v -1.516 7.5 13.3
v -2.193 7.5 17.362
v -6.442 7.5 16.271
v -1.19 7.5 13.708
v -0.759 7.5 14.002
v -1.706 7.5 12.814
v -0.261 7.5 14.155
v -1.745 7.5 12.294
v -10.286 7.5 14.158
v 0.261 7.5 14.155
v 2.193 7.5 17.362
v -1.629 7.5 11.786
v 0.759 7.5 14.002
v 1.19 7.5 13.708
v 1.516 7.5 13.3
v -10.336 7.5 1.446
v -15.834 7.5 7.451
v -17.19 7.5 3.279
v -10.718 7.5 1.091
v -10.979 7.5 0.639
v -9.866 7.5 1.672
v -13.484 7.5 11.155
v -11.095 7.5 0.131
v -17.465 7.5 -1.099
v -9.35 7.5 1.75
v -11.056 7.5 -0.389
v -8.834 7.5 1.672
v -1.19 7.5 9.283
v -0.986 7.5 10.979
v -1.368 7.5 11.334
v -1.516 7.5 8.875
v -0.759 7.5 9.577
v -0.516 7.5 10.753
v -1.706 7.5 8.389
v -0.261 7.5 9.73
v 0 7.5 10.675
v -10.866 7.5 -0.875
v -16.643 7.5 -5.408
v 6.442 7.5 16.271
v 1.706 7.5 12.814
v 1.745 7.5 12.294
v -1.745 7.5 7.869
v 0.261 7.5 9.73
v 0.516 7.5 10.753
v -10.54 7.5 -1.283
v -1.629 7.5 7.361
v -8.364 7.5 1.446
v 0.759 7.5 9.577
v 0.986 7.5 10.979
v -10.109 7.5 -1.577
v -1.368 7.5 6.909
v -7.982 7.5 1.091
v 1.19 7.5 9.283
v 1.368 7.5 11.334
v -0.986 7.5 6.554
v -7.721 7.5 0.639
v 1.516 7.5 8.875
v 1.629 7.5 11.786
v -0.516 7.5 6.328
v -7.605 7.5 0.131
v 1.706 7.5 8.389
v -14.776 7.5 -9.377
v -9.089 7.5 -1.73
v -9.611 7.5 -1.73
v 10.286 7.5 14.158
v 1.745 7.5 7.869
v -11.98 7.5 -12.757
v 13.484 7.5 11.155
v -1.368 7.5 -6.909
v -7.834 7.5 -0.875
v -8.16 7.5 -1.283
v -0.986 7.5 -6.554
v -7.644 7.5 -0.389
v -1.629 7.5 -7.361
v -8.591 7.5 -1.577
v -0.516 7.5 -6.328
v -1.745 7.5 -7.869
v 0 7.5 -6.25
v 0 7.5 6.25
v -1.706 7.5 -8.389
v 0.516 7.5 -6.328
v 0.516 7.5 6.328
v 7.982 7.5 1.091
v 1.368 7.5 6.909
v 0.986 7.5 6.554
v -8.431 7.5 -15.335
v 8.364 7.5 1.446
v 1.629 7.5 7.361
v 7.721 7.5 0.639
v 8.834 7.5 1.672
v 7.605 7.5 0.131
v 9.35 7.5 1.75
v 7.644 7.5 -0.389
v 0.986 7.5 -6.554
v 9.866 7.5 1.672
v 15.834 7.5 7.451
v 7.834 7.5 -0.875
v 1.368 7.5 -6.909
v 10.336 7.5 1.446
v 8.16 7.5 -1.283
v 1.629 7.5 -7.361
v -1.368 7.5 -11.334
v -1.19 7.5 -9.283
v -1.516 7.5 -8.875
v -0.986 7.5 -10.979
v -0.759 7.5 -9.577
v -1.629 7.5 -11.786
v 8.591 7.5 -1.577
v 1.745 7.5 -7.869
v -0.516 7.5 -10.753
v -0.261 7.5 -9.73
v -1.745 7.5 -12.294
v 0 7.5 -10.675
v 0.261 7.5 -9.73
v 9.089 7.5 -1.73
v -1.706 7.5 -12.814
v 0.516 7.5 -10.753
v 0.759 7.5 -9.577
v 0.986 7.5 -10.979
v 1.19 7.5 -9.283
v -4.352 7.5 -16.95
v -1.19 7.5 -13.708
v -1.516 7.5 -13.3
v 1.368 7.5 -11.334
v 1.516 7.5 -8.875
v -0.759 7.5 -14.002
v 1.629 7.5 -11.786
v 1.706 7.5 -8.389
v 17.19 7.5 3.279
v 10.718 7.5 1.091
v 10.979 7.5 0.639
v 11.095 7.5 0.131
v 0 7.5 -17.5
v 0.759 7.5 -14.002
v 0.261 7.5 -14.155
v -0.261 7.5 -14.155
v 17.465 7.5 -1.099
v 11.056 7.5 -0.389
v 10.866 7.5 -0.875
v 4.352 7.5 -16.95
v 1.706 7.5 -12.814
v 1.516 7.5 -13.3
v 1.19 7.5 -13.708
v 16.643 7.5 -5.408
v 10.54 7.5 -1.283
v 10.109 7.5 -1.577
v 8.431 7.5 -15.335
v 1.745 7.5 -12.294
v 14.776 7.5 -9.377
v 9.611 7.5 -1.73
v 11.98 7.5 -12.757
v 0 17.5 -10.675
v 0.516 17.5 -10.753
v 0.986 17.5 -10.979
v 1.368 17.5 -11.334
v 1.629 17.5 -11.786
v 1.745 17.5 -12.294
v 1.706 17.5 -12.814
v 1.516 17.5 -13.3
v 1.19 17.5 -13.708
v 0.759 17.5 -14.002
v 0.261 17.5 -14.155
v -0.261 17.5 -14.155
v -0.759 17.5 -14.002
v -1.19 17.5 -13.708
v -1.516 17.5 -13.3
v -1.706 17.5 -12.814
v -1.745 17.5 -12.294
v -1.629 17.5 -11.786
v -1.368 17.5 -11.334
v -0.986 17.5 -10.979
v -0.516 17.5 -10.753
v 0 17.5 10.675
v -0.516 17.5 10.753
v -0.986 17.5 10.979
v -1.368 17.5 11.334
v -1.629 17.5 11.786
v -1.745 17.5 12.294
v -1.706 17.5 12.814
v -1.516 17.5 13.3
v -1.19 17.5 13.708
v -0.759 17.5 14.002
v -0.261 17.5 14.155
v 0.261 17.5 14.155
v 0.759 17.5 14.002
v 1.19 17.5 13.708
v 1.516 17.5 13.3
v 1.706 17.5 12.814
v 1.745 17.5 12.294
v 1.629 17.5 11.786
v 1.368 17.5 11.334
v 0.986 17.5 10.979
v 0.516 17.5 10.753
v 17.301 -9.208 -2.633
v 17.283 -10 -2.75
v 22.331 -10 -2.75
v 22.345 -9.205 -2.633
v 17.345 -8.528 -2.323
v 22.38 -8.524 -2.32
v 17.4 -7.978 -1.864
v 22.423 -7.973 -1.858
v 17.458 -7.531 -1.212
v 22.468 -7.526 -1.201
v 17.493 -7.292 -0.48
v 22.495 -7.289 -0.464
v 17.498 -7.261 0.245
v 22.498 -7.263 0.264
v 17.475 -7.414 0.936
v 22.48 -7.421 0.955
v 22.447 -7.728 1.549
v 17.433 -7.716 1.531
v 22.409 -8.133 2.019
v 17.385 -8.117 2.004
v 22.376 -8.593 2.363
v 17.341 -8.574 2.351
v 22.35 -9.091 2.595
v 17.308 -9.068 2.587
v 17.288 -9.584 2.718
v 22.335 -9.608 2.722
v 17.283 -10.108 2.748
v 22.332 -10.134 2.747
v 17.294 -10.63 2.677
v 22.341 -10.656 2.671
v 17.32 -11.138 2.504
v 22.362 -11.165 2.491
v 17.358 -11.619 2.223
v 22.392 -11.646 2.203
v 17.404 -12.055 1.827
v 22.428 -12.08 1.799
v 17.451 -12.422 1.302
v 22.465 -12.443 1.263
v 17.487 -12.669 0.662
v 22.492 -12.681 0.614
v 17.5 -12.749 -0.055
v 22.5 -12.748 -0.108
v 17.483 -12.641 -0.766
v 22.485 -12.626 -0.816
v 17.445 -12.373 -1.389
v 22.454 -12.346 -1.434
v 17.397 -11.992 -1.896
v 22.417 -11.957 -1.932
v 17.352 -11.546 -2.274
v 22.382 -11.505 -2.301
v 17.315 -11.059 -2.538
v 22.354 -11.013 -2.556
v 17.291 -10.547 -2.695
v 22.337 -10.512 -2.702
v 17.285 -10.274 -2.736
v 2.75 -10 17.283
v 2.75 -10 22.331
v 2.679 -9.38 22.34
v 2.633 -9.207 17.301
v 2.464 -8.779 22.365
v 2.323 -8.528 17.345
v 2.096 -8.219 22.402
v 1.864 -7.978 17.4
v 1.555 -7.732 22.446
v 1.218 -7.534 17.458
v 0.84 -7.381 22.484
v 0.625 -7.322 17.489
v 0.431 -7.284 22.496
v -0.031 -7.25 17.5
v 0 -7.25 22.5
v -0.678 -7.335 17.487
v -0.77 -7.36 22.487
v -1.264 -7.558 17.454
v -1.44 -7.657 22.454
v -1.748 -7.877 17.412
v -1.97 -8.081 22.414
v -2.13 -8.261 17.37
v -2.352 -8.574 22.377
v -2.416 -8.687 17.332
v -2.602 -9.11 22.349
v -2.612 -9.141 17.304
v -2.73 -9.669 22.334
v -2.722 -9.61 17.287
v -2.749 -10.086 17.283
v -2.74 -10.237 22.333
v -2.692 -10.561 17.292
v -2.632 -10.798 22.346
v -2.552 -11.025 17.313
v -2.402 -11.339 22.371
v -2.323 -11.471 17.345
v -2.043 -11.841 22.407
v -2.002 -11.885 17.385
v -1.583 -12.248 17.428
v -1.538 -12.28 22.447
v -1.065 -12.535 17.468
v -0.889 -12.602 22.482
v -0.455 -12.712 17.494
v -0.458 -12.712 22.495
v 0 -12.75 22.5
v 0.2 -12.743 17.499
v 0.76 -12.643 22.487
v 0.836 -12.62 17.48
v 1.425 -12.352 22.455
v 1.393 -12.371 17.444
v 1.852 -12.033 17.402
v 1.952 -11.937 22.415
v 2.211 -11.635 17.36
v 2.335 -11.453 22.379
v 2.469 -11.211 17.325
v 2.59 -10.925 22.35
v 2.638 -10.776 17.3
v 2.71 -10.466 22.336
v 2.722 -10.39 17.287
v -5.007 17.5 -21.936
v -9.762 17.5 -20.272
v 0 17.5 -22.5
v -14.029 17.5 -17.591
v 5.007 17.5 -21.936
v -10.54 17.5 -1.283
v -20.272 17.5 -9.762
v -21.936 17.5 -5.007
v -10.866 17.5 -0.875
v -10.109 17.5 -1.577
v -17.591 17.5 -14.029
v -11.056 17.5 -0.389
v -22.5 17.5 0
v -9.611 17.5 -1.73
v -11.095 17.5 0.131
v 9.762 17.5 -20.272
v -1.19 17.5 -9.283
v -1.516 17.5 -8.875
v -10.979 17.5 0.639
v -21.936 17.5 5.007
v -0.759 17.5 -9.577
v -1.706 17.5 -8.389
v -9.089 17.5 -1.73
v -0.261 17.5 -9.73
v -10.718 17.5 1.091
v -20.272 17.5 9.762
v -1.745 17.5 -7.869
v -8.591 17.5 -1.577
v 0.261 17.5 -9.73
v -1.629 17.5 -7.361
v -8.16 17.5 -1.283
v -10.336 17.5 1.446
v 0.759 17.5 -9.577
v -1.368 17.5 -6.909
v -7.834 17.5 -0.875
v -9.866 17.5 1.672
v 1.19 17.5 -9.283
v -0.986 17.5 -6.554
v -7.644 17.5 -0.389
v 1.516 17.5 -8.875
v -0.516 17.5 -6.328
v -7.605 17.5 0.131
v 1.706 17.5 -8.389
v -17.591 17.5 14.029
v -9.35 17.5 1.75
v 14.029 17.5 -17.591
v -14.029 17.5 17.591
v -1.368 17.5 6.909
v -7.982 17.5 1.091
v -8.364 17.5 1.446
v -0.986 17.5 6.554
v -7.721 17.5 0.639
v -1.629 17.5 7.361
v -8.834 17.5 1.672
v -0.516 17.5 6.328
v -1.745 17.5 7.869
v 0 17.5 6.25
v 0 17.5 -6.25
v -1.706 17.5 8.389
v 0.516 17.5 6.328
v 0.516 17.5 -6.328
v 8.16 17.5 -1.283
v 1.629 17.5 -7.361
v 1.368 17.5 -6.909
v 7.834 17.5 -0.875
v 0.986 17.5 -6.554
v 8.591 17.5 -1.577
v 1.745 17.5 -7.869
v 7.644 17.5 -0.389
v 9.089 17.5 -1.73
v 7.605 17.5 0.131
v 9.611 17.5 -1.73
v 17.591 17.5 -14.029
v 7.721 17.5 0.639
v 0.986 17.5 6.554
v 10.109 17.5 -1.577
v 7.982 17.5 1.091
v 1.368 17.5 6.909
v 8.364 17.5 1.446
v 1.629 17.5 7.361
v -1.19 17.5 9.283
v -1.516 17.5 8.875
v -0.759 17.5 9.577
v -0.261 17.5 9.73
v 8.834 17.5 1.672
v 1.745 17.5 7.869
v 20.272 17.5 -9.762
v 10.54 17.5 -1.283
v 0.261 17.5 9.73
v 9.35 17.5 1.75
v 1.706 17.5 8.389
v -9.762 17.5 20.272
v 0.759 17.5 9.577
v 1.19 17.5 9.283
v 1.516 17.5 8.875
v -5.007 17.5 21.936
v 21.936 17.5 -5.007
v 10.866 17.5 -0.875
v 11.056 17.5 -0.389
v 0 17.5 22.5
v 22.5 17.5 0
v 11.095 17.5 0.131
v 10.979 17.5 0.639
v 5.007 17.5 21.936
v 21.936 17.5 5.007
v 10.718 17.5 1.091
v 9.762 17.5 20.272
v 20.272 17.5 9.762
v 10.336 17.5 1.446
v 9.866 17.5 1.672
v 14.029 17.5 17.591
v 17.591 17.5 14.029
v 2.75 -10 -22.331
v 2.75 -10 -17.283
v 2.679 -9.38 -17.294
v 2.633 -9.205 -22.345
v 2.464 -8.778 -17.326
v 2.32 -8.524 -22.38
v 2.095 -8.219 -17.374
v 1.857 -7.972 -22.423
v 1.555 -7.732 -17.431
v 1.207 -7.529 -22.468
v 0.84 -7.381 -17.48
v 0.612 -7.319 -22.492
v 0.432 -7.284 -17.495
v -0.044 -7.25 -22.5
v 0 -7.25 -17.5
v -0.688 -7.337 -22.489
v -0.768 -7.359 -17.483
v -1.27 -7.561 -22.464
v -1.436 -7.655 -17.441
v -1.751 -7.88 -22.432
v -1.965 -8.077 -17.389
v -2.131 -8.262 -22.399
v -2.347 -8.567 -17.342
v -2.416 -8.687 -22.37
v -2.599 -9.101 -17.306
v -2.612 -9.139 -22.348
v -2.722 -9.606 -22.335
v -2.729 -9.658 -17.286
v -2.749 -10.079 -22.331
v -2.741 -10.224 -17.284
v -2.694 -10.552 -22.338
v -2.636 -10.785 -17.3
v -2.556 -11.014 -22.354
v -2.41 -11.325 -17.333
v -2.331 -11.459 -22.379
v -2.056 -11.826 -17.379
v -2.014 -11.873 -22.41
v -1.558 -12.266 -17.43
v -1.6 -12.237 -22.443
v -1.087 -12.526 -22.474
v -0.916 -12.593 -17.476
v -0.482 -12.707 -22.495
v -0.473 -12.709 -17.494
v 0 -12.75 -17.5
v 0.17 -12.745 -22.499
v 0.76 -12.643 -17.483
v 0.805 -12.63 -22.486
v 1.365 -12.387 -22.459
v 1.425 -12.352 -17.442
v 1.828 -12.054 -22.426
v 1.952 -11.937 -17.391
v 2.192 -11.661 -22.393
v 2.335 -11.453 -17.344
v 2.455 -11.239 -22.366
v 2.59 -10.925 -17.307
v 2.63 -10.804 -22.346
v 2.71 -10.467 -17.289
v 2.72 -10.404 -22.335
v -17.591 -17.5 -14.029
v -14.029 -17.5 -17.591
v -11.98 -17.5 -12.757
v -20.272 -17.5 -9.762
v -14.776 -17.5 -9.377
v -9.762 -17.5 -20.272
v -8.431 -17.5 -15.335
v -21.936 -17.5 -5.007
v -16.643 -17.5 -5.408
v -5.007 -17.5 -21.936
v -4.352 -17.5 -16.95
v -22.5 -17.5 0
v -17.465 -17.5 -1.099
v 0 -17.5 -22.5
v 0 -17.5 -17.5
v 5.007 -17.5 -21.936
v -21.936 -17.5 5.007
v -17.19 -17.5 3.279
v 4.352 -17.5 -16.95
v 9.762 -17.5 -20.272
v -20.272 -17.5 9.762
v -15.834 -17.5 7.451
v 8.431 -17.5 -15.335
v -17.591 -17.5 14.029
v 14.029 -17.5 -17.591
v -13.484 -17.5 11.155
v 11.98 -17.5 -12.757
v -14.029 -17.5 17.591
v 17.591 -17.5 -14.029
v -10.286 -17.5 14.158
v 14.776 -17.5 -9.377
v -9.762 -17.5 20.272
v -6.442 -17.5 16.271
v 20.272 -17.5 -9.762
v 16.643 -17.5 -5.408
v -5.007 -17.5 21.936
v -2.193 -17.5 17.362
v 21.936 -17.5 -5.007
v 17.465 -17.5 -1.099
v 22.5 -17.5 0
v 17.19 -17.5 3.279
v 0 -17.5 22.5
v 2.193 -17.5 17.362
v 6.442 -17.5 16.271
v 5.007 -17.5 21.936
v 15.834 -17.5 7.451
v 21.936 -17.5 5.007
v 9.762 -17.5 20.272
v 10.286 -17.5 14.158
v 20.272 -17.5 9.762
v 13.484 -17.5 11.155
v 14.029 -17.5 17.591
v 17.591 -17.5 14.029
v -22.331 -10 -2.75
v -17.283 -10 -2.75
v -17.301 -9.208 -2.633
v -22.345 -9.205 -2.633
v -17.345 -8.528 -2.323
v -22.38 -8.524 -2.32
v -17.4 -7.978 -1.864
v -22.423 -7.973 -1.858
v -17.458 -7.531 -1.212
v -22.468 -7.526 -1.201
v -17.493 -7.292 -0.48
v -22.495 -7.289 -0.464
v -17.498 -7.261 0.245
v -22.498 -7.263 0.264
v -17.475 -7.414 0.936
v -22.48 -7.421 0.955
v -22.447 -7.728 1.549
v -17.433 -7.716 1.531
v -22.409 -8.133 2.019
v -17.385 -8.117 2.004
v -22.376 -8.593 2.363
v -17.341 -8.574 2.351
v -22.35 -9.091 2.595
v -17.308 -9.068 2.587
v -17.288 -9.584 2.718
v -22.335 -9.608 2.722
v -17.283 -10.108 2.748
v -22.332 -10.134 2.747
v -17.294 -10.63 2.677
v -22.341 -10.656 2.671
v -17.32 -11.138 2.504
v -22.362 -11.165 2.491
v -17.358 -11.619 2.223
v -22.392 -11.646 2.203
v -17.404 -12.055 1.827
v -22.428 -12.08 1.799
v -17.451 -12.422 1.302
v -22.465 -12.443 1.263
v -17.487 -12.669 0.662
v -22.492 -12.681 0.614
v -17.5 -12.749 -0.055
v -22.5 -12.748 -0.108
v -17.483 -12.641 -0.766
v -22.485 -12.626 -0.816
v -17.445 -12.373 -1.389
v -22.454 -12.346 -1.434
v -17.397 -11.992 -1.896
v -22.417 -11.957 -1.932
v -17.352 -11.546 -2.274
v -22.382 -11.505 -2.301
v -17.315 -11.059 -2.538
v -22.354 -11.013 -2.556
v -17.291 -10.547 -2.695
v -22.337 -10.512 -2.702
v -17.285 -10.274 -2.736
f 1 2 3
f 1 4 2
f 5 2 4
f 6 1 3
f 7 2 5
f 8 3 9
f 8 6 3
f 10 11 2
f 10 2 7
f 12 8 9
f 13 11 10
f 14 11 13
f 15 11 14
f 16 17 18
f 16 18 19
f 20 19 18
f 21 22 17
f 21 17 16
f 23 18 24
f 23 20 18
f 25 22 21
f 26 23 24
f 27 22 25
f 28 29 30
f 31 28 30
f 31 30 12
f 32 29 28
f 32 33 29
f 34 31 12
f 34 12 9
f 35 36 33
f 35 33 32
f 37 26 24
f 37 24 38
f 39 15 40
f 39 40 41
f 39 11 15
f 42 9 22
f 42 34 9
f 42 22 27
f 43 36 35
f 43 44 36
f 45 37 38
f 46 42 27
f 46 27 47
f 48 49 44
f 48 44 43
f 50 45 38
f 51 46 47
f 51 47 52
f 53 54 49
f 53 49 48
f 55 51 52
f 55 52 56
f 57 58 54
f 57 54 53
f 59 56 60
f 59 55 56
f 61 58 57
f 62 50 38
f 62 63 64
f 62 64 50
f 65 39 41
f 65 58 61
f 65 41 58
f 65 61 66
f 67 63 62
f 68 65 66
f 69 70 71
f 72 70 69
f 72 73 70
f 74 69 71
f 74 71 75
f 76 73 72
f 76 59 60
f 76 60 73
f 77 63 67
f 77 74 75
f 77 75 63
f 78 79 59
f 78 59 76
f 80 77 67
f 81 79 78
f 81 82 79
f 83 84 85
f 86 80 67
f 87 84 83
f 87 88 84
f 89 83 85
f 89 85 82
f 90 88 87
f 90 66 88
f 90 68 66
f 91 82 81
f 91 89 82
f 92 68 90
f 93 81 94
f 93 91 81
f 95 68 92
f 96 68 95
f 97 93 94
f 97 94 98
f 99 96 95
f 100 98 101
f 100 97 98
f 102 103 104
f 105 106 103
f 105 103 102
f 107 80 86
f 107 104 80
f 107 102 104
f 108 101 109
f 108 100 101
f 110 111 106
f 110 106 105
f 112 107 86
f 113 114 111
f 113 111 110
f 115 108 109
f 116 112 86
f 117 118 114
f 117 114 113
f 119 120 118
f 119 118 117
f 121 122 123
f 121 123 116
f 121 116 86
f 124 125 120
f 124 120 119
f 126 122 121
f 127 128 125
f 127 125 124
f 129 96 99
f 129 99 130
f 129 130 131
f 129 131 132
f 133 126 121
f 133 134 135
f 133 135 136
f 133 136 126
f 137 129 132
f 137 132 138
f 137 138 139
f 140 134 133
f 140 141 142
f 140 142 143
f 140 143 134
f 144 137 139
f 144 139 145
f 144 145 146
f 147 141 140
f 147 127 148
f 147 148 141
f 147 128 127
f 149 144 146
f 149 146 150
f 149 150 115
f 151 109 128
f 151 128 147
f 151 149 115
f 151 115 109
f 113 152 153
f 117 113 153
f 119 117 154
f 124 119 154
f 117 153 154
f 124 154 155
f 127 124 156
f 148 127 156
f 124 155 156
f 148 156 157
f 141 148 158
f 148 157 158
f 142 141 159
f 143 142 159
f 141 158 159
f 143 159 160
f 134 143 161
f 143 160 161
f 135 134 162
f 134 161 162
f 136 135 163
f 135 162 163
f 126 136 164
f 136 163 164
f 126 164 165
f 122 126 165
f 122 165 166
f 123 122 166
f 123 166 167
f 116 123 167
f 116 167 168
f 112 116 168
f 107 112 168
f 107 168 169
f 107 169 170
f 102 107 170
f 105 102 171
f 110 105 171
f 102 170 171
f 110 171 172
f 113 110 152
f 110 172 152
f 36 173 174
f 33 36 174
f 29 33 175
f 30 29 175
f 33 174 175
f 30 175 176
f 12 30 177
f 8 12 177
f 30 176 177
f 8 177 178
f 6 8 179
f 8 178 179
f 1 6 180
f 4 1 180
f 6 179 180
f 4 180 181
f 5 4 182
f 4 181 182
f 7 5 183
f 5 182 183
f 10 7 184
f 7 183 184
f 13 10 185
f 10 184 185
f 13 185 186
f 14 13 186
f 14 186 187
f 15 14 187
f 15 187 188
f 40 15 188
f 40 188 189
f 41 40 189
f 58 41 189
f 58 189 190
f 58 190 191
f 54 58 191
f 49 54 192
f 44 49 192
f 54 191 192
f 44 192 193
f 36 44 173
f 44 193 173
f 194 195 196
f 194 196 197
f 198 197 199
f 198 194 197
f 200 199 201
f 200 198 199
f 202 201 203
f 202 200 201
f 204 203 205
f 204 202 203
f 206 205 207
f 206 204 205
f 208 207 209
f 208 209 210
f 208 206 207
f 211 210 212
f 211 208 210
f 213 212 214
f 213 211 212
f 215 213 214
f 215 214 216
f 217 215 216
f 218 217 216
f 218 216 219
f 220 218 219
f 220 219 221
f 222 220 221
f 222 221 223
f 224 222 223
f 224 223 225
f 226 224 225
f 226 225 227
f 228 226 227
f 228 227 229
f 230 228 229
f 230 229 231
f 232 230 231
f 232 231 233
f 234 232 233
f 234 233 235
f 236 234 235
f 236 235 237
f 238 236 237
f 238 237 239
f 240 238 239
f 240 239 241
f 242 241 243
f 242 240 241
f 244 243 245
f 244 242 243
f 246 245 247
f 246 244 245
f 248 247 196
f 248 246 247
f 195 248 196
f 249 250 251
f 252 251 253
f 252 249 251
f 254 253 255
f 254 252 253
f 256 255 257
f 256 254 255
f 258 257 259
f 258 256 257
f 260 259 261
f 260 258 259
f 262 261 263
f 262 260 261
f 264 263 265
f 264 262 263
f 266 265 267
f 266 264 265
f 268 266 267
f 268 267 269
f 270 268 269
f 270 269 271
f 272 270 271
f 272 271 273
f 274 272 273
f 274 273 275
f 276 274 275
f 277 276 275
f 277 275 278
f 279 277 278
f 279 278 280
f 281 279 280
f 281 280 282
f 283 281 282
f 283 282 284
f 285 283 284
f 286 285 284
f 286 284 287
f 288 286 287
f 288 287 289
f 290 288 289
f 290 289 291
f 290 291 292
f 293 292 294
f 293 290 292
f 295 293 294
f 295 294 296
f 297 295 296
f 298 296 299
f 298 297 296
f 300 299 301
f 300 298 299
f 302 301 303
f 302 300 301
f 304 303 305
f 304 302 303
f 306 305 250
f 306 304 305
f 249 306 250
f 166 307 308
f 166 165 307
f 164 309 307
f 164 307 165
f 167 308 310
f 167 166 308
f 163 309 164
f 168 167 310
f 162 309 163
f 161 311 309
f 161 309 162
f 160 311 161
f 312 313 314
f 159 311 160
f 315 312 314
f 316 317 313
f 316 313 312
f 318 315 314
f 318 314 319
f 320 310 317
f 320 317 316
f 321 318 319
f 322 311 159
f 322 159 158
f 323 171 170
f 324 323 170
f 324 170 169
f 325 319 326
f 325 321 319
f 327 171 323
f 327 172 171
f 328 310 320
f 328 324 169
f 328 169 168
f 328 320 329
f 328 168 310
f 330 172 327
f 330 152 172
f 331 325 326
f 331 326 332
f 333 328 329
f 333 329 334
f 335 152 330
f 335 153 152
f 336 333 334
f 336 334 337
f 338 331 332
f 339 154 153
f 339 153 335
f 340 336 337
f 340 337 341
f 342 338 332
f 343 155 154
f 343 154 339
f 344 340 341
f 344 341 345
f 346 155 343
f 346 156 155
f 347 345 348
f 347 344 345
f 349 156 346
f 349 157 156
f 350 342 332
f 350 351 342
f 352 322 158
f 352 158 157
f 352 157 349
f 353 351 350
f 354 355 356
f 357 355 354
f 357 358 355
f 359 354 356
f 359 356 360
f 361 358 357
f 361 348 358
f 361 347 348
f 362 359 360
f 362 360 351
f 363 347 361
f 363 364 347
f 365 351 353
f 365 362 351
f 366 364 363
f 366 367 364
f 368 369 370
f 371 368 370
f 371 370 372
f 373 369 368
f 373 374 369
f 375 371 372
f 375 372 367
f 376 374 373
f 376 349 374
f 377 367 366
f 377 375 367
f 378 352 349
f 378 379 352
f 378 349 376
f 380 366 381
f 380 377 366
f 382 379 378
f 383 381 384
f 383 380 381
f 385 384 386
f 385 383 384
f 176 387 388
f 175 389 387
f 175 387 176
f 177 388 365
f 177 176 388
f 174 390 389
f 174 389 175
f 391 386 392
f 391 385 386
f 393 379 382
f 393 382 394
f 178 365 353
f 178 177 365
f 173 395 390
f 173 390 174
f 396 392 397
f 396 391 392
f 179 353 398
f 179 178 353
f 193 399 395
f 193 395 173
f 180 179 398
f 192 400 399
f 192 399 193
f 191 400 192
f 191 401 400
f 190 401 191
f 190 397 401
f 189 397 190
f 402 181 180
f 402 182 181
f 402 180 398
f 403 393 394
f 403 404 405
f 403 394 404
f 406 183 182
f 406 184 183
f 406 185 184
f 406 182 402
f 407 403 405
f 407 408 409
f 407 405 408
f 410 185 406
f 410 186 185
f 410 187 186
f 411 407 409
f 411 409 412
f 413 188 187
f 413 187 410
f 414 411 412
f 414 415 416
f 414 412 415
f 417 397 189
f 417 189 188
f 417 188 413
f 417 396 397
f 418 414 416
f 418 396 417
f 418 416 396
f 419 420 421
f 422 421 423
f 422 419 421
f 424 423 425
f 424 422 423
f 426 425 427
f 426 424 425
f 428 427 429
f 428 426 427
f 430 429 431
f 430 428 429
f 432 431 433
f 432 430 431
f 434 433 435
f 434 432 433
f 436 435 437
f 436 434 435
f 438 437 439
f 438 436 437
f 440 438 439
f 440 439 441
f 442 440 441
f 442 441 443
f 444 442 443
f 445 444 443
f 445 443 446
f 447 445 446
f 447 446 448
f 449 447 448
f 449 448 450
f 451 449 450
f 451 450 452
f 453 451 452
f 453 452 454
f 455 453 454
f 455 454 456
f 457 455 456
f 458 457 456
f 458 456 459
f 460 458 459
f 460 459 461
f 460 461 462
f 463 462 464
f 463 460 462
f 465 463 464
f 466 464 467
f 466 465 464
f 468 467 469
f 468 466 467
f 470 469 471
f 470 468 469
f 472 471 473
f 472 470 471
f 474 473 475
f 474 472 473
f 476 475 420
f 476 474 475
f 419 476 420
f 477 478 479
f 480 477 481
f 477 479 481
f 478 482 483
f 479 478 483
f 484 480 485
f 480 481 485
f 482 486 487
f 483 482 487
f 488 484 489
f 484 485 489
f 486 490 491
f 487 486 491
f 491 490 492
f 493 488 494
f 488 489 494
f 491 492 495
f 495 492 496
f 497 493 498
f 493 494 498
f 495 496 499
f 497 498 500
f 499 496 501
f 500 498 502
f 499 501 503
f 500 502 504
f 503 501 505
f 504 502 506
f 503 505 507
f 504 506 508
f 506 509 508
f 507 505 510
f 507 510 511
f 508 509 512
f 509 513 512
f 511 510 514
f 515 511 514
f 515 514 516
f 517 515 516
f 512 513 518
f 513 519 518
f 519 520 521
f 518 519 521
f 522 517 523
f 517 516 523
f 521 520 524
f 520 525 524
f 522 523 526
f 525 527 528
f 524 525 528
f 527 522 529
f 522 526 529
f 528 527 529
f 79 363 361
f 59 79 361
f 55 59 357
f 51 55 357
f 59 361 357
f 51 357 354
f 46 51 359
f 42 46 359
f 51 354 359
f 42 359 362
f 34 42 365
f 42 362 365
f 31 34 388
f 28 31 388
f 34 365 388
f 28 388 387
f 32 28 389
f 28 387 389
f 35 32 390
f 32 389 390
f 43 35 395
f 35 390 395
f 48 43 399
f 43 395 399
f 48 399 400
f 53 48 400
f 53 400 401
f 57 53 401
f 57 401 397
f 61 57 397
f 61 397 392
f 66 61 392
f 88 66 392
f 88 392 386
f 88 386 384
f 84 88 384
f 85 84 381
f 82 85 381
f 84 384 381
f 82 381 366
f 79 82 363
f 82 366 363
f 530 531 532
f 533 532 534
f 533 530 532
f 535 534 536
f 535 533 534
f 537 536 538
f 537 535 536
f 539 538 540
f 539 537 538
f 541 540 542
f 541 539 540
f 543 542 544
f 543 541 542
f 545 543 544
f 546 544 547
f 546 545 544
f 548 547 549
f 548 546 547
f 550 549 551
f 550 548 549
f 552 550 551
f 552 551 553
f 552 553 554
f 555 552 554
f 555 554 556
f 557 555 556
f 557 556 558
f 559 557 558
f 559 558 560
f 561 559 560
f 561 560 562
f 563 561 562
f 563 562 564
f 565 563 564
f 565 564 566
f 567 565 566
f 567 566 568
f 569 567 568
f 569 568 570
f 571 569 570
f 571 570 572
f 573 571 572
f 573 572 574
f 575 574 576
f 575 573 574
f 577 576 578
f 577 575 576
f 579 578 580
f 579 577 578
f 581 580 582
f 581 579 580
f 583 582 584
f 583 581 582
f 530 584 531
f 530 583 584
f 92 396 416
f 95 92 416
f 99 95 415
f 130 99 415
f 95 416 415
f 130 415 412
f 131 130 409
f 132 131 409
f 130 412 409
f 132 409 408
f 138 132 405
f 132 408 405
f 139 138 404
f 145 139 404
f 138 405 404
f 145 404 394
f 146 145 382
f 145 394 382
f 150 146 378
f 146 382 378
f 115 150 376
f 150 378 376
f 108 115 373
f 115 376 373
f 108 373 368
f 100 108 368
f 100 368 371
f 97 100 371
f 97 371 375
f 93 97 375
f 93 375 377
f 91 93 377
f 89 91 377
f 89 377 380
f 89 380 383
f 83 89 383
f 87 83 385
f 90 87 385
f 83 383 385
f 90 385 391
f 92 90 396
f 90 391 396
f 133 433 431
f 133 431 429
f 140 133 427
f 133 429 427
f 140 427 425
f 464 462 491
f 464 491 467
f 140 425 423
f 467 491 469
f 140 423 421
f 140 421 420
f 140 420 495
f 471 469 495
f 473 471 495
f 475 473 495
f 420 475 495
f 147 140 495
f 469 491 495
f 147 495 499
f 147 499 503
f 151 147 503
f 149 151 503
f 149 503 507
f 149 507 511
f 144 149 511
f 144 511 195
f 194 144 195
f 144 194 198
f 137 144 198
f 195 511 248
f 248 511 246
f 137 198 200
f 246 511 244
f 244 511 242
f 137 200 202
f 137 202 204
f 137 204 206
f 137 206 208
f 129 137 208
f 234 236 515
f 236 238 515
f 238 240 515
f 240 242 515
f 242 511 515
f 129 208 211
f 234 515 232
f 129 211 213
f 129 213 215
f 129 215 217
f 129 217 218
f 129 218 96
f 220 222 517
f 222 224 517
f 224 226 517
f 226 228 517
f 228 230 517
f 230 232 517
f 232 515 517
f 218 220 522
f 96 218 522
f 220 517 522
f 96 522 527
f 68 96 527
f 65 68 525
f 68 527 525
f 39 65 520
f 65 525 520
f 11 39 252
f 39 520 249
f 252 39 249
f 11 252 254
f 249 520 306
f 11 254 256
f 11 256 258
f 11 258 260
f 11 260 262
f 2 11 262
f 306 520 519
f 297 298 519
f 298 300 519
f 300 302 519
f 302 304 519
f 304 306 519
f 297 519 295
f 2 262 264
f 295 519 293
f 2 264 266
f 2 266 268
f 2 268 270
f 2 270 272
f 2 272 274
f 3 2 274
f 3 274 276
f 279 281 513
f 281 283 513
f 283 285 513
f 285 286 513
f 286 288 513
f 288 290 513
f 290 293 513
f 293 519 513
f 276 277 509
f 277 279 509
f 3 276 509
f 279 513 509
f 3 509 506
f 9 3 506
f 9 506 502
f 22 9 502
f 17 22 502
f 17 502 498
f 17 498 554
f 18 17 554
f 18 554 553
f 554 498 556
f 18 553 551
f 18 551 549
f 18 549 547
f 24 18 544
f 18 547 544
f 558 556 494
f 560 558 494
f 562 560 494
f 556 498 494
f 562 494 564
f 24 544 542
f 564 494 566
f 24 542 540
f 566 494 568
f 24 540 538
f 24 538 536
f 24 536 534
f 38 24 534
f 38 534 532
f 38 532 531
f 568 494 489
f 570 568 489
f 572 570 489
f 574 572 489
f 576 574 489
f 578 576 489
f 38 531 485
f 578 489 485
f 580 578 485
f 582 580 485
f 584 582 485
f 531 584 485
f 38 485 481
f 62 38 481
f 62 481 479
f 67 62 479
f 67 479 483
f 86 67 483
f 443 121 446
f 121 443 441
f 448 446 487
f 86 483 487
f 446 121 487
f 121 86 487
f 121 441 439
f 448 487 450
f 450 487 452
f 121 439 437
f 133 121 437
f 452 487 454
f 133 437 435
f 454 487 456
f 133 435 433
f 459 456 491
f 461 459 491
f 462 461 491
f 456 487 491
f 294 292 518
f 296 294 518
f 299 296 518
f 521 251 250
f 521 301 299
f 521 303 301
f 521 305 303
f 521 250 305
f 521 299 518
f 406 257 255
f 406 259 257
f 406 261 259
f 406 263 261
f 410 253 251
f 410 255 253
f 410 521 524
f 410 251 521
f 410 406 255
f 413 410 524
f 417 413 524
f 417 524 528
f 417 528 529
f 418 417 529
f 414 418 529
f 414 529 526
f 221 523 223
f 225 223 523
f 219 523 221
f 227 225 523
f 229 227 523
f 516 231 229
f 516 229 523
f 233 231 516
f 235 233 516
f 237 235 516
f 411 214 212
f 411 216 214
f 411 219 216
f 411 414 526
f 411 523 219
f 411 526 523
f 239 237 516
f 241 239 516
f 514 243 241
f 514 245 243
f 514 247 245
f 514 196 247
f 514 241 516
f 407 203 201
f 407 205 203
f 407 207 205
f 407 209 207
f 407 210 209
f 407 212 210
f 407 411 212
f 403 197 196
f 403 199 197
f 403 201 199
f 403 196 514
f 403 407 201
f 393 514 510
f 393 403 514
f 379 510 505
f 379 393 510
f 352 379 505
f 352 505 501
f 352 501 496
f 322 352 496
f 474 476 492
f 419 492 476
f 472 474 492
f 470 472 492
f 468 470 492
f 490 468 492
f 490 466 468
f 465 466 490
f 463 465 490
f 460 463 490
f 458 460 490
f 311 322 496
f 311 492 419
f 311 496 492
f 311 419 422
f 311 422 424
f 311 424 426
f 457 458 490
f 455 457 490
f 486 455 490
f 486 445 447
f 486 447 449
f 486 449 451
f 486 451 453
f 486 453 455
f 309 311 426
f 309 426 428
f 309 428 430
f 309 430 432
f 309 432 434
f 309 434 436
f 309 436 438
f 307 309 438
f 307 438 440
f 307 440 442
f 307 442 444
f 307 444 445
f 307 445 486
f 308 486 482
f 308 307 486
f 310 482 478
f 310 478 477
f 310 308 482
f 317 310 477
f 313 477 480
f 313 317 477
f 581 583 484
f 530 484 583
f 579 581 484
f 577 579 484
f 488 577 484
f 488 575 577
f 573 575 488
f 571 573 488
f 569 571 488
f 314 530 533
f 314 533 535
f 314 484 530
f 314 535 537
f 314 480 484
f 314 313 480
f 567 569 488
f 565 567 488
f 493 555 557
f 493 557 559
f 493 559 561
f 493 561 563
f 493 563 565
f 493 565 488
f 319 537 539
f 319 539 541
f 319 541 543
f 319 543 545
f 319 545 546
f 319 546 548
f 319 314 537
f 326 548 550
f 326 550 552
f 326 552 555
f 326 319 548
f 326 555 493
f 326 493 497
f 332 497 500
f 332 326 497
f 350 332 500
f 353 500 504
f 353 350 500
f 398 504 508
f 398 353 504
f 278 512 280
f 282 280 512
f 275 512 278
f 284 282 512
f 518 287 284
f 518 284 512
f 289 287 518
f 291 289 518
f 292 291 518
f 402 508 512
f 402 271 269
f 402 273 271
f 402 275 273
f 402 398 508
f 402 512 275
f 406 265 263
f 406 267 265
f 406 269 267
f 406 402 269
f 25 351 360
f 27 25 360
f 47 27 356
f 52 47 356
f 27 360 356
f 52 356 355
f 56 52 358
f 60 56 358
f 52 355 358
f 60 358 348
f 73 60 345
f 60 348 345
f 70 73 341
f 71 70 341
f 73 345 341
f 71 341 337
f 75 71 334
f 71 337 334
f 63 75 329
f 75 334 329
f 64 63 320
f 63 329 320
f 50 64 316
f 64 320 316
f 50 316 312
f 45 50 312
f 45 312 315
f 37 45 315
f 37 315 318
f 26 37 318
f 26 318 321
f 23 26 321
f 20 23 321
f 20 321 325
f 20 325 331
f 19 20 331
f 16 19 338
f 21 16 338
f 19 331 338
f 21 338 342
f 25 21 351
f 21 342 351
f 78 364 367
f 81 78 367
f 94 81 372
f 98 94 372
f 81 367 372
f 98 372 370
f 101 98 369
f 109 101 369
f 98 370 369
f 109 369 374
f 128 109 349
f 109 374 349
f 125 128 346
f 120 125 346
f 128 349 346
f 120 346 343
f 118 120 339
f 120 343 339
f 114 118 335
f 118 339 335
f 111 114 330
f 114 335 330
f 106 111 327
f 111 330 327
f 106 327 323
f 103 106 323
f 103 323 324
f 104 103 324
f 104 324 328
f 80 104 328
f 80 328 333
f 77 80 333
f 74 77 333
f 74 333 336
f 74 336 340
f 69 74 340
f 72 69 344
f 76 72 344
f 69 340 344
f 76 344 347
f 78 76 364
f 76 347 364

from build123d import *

# Parameters (mm, degrees)
SKETCH1_R               = 22.5
BOSS_EXTRUDE1_DEPTH     = 17.5
SKETCH2_R               = 17.5
CUT_EXTRUDE1_DEPTH      = 25
CUT_EXTRUDE2_DEPTH      = 37.314597616
CUT_EXTRUDE2_DEPTH_BACK = 37.314597616
SKETCH3_R               = 2.75
CUT_EXTRUDE3_DEPTH      = 37.314597788
CUT_EXTRUDE3_DEPTH_BACK = 37.314597788
SKETCH4_R               = 2.75
SKETCH5_R               = 1.75
CUT_EXTRUDE4_DEPTH      = 10


with BuildPart() as part:
    # Sketch1 → Boss-Extrude1 (new, symmetric)
    with BuildSketch(Plane(origin=(0, 0, 0), x_dir=(1, 0, 0), z_dir=(0, 1, 0))):
        with Locations(Location((0, 0, 0), (0, 0, 270))):
            Circle(SKETCH1_R)
    extrude(amount=BOSS_EXTRUDE1_DEPTH, both=True)

    # Sketch2 → Cut-Extrude1 (cut)
    with BuildSketch(Plane.XZ.offset(17.5)):
        with Locations(Location((0, 0, 0), (0, 0, 270))):
            Circle(SKETCH2_R)
    extrude(amount=-CUT_EXTRUDE1_DEPTH, mode=Mode.SUBTRACT)

    # Sketch3 → Cut-Extrude2 (cut, two sides: drawn at the far end of the back side and taken through both)
    with BuildSketch(Plane(origin=(0, 0, 0), x_dir=(0, 0, -1), z_dir=(1, 0, 0)).offset(-CUT_EXTRUDE2_DEPTH_BACK)):
        with Locations((0, -10)):
            Circle(SKETCH3_R)
    extrude(amount=CUT_EXTRUDE2_DEPTH + CUT_EXTRUDE2_DEPTH_BACK, mode=Mode.SUBTRACT)

    # Sketch4 → Cut-Extrude3 (cut, two sides: drawn at the far end of the back side and taken through both)
    with BuildSketch(Plane.XY.offset(-CUT_EXTRUDE3_DEPTH_BACK)):
        with Locations((0, -10)):
            Circle(SKETCH4_R)
    extrude(amount=CUT_EXTRUDE3_DEPTH + CUT_EXTRUDE3_DEPTH_BACK, mode=Mode.SUBTRACT)

    # Sketch5 → Cut-Extrude4 (cut)
    with BuildSketch(Plane(origin=(0, 17.5, 0), x_dir=(1, 0, 0), z_dir=(0, 1, 0))):
        with Locations(Location((0, 12.425, 0), (0, 0, 270))):
            Circle(SKETCH5_R)
        with Locations(Location((0, 8, 0), (0, 0, 270))):
            Circle(SKETCH5_R)
        with Locations(Location((0, -8, 0), (0, 0, 90))):
            Circle(SKETCH5_R)
        with Locations(Location((0, -12.425, 0), (0, 0, 90))):
            Circle(SKETCH5_R)
        with Locations(Location((-9.35, 0, 0), (0, 0, 270))):
            Circle(SKETCH5_R)
        with Locations(Location((9.35, 0, 0), (0, 0, 270))):
            Circle(SKETCH5_R)
    extrude(amount=-CUT_EXTRUDE4_DEPTH, mode=Mode.SUBTRACT)


solid = part.part
